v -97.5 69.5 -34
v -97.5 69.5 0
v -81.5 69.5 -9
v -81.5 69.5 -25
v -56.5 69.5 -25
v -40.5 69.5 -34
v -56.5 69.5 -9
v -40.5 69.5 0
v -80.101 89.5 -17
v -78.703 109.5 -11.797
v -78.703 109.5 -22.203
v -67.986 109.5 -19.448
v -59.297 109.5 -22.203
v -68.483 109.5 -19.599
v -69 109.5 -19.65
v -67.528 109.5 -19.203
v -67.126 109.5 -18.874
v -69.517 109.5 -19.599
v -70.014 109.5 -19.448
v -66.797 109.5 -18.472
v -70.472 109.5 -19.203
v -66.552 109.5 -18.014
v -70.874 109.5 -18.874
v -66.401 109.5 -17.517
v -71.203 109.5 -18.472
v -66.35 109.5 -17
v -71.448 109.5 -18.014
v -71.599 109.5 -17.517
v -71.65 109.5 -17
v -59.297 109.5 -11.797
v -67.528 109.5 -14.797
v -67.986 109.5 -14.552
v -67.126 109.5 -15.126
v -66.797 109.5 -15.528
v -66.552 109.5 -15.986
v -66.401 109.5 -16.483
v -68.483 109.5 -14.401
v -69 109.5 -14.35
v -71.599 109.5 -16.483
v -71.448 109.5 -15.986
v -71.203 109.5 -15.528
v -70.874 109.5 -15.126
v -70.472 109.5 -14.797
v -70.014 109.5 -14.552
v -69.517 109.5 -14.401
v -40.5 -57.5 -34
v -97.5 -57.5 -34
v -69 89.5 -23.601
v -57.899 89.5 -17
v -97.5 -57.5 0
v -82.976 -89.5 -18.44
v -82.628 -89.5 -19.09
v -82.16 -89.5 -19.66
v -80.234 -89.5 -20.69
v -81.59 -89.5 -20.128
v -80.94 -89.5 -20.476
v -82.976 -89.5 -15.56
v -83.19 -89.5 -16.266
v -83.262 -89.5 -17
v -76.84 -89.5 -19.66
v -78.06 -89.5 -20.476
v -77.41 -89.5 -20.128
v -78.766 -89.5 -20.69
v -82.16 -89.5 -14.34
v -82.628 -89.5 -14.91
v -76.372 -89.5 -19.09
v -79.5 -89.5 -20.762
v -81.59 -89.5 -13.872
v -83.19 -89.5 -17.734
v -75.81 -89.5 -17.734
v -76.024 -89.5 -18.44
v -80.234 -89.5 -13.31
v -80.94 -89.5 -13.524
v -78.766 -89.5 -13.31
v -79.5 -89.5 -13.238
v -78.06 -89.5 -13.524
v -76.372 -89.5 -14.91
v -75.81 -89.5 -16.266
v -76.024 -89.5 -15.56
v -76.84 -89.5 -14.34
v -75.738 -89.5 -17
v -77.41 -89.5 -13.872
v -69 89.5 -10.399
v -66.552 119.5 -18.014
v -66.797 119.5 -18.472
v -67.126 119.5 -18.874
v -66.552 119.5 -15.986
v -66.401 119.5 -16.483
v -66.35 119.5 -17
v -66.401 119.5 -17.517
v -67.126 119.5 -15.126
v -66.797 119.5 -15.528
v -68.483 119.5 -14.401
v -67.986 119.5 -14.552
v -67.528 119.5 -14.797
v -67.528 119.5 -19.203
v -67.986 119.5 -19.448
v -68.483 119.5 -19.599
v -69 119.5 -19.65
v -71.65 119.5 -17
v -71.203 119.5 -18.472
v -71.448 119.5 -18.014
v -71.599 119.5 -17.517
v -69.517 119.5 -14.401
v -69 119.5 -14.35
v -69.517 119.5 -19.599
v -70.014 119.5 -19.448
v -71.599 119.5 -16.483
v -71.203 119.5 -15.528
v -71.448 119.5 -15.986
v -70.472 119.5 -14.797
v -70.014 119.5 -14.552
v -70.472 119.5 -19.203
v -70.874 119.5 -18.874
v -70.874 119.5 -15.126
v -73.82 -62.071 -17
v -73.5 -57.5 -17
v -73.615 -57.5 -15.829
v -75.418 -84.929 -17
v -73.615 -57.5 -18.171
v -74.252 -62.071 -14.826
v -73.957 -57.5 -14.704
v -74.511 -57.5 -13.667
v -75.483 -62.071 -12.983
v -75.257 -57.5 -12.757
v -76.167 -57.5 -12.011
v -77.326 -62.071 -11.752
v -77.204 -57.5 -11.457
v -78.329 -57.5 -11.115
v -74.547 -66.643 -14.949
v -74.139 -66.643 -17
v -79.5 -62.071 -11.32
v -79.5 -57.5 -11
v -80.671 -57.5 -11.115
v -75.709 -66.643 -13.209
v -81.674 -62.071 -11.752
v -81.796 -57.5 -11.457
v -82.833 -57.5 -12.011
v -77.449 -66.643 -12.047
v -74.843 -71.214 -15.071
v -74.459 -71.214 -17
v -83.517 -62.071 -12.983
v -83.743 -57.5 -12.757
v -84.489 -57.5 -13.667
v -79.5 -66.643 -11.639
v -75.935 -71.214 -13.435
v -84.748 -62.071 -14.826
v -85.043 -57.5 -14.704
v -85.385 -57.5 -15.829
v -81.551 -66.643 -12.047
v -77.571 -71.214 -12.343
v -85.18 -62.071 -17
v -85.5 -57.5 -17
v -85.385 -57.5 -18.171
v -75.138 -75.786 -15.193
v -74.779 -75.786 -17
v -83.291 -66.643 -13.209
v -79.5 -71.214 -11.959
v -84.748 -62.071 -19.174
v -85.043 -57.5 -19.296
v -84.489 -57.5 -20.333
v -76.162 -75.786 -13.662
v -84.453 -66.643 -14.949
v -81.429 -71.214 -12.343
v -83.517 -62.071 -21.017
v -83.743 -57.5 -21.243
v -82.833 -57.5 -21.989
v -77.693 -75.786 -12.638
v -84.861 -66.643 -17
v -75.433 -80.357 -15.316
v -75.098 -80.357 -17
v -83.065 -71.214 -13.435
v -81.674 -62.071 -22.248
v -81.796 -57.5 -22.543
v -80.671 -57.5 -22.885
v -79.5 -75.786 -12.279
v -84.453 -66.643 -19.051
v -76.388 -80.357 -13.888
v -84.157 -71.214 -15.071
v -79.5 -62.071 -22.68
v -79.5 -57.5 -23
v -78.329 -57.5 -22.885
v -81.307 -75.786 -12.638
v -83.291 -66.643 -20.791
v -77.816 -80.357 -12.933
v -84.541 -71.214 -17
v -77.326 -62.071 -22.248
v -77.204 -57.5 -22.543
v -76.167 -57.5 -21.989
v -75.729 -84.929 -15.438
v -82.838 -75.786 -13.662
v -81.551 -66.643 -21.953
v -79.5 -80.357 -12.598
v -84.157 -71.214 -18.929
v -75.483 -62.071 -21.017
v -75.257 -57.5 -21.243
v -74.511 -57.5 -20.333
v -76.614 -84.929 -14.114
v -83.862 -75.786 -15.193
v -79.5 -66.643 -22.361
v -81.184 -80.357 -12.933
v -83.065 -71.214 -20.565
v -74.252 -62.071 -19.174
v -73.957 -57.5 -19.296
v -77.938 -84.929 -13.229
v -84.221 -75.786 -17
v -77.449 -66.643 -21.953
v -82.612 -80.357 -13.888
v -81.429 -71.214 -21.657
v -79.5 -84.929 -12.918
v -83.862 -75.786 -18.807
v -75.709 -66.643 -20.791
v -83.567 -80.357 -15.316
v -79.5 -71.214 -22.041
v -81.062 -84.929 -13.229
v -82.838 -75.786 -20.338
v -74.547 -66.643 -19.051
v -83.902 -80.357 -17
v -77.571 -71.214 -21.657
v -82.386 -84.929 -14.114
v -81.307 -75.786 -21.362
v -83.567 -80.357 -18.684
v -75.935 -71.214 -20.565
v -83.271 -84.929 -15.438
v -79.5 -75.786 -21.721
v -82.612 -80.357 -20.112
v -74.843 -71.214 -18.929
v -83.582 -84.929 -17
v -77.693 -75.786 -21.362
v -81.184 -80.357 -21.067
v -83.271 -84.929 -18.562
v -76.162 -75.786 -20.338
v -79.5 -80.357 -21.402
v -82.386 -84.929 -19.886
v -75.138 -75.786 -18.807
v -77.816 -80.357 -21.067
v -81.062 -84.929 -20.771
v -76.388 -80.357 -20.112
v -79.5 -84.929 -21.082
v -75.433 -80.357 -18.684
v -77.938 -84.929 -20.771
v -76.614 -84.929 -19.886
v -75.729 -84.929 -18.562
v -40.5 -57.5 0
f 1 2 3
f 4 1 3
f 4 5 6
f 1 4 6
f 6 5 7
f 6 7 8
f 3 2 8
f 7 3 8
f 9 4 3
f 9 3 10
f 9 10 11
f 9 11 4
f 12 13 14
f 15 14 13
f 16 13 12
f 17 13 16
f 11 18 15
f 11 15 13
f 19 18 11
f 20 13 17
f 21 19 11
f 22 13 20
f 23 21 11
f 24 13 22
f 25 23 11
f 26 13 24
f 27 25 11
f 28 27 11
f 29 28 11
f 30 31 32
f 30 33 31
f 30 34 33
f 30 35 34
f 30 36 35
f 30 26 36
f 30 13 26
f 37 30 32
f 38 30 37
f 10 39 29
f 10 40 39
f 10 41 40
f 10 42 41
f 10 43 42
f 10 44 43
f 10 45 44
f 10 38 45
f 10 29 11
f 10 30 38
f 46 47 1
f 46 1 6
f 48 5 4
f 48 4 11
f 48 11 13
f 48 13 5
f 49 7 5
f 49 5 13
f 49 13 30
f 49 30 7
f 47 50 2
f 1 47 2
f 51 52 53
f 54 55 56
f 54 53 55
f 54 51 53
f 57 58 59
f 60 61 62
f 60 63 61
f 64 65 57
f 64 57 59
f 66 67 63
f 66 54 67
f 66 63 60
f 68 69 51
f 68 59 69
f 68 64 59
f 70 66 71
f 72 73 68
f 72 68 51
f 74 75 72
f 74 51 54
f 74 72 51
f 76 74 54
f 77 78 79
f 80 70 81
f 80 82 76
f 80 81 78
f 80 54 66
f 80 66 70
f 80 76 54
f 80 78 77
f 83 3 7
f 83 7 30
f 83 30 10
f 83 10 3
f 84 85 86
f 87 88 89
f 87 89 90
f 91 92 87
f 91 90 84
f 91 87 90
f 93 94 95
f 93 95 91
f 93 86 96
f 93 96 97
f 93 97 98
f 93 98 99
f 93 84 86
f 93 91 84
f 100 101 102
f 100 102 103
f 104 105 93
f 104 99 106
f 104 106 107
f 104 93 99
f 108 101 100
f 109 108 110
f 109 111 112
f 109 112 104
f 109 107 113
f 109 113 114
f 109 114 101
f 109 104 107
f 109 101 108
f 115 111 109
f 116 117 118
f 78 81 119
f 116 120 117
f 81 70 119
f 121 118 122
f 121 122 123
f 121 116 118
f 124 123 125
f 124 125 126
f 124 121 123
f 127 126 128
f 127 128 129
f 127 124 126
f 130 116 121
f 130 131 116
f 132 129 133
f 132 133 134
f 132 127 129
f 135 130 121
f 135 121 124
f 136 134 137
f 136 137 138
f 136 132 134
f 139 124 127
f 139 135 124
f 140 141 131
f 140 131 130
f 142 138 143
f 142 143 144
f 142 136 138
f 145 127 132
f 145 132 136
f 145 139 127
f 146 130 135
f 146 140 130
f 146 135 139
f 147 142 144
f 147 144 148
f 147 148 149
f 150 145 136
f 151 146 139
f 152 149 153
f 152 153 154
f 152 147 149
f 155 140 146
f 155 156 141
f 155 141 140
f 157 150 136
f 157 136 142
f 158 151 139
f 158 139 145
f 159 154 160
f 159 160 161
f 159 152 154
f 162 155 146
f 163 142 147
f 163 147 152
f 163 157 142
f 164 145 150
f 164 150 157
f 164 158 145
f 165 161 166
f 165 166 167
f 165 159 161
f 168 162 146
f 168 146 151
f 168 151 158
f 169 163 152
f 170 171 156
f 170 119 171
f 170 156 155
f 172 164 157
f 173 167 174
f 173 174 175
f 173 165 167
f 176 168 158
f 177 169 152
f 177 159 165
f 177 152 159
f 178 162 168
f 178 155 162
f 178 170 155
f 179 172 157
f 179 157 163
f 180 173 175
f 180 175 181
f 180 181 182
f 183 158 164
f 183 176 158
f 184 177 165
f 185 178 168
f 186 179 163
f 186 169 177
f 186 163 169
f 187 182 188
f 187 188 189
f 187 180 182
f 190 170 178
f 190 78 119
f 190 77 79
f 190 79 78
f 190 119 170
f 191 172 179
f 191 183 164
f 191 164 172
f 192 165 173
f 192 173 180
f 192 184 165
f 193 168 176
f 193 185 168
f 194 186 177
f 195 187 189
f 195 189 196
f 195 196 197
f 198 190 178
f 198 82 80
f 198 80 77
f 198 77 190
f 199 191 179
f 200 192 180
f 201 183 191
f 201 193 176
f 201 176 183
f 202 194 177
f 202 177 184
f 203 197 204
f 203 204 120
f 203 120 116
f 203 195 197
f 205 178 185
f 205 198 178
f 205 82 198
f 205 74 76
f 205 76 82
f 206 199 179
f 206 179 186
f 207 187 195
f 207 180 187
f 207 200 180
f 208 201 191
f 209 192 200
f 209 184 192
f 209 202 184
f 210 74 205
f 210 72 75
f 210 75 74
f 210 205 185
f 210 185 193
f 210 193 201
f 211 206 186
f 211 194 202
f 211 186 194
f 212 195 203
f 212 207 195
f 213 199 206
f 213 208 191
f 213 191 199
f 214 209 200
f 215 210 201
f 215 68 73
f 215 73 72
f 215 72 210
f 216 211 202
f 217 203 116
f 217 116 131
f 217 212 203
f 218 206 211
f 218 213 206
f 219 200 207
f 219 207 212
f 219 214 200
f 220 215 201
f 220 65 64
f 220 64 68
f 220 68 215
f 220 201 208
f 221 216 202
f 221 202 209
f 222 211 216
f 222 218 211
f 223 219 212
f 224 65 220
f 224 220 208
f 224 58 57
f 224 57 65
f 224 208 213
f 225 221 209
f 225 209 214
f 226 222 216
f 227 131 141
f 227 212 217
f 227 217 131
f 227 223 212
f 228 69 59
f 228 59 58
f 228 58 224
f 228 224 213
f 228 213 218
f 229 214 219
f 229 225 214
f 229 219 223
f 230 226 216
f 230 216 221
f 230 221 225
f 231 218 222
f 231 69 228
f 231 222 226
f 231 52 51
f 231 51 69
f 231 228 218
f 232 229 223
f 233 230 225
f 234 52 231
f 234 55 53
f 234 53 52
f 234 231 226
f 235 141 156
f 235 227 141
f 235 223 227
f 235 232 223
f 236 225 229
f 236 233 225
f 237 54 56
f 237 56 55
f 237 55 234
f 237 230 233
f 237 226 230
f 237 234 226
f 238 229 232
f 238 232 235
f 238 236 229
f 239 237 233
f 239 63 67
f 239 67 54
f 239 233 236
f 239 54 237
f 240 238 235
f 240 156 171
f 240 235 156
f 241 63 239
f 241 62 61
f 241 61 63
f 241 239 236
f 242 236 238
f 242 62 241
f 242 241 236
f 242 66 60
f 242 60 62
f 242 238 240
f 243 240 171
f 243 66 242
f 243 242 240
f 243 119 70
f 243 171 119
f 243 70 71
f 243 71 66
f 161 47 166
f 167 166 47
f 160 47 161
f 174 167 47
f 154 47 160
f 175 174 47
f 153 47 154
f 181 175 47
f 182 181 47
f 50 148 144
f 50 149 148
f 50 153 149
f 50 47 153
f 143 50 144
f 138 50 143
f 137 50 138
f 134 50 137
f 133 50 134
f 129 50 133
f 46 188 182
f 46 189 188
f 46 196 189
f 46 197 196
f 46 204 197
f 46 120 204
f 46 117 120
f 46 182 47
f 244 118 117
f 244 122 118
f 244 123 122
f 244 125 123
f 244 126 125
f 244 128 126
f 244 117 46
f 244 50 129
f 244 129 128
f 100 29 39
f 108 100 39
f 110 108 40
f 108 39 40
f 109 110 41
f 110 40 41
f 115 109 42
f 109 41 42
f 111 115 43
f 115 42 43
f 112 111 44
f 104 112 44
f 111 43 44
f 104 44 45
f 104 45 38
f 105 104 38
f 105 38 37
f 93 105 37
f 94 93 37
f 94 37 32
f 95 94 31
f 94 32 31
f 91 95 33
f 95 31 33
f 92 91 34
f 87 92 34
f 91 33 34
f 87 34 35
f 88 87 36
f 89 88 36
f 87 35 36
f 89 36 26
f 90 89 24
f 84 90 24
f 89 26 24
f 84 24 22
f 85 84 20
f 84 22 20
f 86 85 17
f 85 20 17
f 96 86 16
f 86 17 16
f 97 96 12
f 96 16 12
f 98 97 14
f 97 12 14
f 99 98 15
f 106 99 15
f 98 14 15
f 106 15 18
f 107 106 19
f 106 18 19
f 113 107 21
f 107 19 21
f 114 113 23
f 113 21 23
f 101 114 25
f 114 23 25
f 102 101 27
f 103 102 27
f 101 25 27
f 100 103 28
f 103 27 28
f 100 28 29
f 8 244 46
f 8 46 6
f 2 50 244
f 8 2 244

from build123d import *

# Parameters (mm, degrees)
SKETCH004_W  = 57
SKETCH004_H  = 127
PAD002_DEPTH = 34
SKETCH005_W  = 25
SKETCH005_H  = 16
PAD003_DEPTH = 40
PAD003_TAPER = 4
SKETCH006_R  = 2.65
PAD004_DEPTH = 10
SKETCH007_R  = 6
PAD005_DEPTH = 32
PAD005_TAPER = 4


with BuildPart() as part:
    # Sketch004 → Pad002 (new body)
    with BuildSketch(Plane.XY):
        Rectangle(SKETCH004_W, SKETCH004_H)
    extrude(amount=-PAD002_DEPTH)

    # Sketch005 (on Face1 of Pad002) → Pad003 (join)
    with BuildSketch(Plane(origin=(0, 63.5, 0), x_dir=(-1, 0, 0), z_dir=(0, 1, 0))):
        with Locations((0, -17)):
            Rectangle(SKETCH005_W, SKETCH005_H)
    extrude(amount=PAD003_DEPTH, taper=PAD003_TAPER)

    # Sketch006 (on Face11 of Pad003) → Pad004 (join)
    with BuildSketch(Plane(origin=(0, 103.5, 0), x_dir=(-1, 0, 0), z_dir=(0, 1, 0))):
        with Locations((0, -17)):
            Circle(SKETCH006_R)
    extrude(amount=PAD004_DEPTH)

    # Sketch007 (on Face10 of Pad004) → Pad005 (join)
    with BuildSketch(Plane.XZ.offset(63.5)):
        with Locations((-10.5, -17)):
            Circle(SKETCH007_R)
    extrude(amount=PAD005_DEPTH, taper=PAD005_TAPER)


with BuildPart() as part_1:
    # Body002 placement: moved
    add(part.part.moved(Location((63, 6, 0))))


with BuildPart() as part_2:
    # Body003 placement: moved
    add(part_1.part.moved(Location((-132, 0, 0))))


solid = part_2.part
